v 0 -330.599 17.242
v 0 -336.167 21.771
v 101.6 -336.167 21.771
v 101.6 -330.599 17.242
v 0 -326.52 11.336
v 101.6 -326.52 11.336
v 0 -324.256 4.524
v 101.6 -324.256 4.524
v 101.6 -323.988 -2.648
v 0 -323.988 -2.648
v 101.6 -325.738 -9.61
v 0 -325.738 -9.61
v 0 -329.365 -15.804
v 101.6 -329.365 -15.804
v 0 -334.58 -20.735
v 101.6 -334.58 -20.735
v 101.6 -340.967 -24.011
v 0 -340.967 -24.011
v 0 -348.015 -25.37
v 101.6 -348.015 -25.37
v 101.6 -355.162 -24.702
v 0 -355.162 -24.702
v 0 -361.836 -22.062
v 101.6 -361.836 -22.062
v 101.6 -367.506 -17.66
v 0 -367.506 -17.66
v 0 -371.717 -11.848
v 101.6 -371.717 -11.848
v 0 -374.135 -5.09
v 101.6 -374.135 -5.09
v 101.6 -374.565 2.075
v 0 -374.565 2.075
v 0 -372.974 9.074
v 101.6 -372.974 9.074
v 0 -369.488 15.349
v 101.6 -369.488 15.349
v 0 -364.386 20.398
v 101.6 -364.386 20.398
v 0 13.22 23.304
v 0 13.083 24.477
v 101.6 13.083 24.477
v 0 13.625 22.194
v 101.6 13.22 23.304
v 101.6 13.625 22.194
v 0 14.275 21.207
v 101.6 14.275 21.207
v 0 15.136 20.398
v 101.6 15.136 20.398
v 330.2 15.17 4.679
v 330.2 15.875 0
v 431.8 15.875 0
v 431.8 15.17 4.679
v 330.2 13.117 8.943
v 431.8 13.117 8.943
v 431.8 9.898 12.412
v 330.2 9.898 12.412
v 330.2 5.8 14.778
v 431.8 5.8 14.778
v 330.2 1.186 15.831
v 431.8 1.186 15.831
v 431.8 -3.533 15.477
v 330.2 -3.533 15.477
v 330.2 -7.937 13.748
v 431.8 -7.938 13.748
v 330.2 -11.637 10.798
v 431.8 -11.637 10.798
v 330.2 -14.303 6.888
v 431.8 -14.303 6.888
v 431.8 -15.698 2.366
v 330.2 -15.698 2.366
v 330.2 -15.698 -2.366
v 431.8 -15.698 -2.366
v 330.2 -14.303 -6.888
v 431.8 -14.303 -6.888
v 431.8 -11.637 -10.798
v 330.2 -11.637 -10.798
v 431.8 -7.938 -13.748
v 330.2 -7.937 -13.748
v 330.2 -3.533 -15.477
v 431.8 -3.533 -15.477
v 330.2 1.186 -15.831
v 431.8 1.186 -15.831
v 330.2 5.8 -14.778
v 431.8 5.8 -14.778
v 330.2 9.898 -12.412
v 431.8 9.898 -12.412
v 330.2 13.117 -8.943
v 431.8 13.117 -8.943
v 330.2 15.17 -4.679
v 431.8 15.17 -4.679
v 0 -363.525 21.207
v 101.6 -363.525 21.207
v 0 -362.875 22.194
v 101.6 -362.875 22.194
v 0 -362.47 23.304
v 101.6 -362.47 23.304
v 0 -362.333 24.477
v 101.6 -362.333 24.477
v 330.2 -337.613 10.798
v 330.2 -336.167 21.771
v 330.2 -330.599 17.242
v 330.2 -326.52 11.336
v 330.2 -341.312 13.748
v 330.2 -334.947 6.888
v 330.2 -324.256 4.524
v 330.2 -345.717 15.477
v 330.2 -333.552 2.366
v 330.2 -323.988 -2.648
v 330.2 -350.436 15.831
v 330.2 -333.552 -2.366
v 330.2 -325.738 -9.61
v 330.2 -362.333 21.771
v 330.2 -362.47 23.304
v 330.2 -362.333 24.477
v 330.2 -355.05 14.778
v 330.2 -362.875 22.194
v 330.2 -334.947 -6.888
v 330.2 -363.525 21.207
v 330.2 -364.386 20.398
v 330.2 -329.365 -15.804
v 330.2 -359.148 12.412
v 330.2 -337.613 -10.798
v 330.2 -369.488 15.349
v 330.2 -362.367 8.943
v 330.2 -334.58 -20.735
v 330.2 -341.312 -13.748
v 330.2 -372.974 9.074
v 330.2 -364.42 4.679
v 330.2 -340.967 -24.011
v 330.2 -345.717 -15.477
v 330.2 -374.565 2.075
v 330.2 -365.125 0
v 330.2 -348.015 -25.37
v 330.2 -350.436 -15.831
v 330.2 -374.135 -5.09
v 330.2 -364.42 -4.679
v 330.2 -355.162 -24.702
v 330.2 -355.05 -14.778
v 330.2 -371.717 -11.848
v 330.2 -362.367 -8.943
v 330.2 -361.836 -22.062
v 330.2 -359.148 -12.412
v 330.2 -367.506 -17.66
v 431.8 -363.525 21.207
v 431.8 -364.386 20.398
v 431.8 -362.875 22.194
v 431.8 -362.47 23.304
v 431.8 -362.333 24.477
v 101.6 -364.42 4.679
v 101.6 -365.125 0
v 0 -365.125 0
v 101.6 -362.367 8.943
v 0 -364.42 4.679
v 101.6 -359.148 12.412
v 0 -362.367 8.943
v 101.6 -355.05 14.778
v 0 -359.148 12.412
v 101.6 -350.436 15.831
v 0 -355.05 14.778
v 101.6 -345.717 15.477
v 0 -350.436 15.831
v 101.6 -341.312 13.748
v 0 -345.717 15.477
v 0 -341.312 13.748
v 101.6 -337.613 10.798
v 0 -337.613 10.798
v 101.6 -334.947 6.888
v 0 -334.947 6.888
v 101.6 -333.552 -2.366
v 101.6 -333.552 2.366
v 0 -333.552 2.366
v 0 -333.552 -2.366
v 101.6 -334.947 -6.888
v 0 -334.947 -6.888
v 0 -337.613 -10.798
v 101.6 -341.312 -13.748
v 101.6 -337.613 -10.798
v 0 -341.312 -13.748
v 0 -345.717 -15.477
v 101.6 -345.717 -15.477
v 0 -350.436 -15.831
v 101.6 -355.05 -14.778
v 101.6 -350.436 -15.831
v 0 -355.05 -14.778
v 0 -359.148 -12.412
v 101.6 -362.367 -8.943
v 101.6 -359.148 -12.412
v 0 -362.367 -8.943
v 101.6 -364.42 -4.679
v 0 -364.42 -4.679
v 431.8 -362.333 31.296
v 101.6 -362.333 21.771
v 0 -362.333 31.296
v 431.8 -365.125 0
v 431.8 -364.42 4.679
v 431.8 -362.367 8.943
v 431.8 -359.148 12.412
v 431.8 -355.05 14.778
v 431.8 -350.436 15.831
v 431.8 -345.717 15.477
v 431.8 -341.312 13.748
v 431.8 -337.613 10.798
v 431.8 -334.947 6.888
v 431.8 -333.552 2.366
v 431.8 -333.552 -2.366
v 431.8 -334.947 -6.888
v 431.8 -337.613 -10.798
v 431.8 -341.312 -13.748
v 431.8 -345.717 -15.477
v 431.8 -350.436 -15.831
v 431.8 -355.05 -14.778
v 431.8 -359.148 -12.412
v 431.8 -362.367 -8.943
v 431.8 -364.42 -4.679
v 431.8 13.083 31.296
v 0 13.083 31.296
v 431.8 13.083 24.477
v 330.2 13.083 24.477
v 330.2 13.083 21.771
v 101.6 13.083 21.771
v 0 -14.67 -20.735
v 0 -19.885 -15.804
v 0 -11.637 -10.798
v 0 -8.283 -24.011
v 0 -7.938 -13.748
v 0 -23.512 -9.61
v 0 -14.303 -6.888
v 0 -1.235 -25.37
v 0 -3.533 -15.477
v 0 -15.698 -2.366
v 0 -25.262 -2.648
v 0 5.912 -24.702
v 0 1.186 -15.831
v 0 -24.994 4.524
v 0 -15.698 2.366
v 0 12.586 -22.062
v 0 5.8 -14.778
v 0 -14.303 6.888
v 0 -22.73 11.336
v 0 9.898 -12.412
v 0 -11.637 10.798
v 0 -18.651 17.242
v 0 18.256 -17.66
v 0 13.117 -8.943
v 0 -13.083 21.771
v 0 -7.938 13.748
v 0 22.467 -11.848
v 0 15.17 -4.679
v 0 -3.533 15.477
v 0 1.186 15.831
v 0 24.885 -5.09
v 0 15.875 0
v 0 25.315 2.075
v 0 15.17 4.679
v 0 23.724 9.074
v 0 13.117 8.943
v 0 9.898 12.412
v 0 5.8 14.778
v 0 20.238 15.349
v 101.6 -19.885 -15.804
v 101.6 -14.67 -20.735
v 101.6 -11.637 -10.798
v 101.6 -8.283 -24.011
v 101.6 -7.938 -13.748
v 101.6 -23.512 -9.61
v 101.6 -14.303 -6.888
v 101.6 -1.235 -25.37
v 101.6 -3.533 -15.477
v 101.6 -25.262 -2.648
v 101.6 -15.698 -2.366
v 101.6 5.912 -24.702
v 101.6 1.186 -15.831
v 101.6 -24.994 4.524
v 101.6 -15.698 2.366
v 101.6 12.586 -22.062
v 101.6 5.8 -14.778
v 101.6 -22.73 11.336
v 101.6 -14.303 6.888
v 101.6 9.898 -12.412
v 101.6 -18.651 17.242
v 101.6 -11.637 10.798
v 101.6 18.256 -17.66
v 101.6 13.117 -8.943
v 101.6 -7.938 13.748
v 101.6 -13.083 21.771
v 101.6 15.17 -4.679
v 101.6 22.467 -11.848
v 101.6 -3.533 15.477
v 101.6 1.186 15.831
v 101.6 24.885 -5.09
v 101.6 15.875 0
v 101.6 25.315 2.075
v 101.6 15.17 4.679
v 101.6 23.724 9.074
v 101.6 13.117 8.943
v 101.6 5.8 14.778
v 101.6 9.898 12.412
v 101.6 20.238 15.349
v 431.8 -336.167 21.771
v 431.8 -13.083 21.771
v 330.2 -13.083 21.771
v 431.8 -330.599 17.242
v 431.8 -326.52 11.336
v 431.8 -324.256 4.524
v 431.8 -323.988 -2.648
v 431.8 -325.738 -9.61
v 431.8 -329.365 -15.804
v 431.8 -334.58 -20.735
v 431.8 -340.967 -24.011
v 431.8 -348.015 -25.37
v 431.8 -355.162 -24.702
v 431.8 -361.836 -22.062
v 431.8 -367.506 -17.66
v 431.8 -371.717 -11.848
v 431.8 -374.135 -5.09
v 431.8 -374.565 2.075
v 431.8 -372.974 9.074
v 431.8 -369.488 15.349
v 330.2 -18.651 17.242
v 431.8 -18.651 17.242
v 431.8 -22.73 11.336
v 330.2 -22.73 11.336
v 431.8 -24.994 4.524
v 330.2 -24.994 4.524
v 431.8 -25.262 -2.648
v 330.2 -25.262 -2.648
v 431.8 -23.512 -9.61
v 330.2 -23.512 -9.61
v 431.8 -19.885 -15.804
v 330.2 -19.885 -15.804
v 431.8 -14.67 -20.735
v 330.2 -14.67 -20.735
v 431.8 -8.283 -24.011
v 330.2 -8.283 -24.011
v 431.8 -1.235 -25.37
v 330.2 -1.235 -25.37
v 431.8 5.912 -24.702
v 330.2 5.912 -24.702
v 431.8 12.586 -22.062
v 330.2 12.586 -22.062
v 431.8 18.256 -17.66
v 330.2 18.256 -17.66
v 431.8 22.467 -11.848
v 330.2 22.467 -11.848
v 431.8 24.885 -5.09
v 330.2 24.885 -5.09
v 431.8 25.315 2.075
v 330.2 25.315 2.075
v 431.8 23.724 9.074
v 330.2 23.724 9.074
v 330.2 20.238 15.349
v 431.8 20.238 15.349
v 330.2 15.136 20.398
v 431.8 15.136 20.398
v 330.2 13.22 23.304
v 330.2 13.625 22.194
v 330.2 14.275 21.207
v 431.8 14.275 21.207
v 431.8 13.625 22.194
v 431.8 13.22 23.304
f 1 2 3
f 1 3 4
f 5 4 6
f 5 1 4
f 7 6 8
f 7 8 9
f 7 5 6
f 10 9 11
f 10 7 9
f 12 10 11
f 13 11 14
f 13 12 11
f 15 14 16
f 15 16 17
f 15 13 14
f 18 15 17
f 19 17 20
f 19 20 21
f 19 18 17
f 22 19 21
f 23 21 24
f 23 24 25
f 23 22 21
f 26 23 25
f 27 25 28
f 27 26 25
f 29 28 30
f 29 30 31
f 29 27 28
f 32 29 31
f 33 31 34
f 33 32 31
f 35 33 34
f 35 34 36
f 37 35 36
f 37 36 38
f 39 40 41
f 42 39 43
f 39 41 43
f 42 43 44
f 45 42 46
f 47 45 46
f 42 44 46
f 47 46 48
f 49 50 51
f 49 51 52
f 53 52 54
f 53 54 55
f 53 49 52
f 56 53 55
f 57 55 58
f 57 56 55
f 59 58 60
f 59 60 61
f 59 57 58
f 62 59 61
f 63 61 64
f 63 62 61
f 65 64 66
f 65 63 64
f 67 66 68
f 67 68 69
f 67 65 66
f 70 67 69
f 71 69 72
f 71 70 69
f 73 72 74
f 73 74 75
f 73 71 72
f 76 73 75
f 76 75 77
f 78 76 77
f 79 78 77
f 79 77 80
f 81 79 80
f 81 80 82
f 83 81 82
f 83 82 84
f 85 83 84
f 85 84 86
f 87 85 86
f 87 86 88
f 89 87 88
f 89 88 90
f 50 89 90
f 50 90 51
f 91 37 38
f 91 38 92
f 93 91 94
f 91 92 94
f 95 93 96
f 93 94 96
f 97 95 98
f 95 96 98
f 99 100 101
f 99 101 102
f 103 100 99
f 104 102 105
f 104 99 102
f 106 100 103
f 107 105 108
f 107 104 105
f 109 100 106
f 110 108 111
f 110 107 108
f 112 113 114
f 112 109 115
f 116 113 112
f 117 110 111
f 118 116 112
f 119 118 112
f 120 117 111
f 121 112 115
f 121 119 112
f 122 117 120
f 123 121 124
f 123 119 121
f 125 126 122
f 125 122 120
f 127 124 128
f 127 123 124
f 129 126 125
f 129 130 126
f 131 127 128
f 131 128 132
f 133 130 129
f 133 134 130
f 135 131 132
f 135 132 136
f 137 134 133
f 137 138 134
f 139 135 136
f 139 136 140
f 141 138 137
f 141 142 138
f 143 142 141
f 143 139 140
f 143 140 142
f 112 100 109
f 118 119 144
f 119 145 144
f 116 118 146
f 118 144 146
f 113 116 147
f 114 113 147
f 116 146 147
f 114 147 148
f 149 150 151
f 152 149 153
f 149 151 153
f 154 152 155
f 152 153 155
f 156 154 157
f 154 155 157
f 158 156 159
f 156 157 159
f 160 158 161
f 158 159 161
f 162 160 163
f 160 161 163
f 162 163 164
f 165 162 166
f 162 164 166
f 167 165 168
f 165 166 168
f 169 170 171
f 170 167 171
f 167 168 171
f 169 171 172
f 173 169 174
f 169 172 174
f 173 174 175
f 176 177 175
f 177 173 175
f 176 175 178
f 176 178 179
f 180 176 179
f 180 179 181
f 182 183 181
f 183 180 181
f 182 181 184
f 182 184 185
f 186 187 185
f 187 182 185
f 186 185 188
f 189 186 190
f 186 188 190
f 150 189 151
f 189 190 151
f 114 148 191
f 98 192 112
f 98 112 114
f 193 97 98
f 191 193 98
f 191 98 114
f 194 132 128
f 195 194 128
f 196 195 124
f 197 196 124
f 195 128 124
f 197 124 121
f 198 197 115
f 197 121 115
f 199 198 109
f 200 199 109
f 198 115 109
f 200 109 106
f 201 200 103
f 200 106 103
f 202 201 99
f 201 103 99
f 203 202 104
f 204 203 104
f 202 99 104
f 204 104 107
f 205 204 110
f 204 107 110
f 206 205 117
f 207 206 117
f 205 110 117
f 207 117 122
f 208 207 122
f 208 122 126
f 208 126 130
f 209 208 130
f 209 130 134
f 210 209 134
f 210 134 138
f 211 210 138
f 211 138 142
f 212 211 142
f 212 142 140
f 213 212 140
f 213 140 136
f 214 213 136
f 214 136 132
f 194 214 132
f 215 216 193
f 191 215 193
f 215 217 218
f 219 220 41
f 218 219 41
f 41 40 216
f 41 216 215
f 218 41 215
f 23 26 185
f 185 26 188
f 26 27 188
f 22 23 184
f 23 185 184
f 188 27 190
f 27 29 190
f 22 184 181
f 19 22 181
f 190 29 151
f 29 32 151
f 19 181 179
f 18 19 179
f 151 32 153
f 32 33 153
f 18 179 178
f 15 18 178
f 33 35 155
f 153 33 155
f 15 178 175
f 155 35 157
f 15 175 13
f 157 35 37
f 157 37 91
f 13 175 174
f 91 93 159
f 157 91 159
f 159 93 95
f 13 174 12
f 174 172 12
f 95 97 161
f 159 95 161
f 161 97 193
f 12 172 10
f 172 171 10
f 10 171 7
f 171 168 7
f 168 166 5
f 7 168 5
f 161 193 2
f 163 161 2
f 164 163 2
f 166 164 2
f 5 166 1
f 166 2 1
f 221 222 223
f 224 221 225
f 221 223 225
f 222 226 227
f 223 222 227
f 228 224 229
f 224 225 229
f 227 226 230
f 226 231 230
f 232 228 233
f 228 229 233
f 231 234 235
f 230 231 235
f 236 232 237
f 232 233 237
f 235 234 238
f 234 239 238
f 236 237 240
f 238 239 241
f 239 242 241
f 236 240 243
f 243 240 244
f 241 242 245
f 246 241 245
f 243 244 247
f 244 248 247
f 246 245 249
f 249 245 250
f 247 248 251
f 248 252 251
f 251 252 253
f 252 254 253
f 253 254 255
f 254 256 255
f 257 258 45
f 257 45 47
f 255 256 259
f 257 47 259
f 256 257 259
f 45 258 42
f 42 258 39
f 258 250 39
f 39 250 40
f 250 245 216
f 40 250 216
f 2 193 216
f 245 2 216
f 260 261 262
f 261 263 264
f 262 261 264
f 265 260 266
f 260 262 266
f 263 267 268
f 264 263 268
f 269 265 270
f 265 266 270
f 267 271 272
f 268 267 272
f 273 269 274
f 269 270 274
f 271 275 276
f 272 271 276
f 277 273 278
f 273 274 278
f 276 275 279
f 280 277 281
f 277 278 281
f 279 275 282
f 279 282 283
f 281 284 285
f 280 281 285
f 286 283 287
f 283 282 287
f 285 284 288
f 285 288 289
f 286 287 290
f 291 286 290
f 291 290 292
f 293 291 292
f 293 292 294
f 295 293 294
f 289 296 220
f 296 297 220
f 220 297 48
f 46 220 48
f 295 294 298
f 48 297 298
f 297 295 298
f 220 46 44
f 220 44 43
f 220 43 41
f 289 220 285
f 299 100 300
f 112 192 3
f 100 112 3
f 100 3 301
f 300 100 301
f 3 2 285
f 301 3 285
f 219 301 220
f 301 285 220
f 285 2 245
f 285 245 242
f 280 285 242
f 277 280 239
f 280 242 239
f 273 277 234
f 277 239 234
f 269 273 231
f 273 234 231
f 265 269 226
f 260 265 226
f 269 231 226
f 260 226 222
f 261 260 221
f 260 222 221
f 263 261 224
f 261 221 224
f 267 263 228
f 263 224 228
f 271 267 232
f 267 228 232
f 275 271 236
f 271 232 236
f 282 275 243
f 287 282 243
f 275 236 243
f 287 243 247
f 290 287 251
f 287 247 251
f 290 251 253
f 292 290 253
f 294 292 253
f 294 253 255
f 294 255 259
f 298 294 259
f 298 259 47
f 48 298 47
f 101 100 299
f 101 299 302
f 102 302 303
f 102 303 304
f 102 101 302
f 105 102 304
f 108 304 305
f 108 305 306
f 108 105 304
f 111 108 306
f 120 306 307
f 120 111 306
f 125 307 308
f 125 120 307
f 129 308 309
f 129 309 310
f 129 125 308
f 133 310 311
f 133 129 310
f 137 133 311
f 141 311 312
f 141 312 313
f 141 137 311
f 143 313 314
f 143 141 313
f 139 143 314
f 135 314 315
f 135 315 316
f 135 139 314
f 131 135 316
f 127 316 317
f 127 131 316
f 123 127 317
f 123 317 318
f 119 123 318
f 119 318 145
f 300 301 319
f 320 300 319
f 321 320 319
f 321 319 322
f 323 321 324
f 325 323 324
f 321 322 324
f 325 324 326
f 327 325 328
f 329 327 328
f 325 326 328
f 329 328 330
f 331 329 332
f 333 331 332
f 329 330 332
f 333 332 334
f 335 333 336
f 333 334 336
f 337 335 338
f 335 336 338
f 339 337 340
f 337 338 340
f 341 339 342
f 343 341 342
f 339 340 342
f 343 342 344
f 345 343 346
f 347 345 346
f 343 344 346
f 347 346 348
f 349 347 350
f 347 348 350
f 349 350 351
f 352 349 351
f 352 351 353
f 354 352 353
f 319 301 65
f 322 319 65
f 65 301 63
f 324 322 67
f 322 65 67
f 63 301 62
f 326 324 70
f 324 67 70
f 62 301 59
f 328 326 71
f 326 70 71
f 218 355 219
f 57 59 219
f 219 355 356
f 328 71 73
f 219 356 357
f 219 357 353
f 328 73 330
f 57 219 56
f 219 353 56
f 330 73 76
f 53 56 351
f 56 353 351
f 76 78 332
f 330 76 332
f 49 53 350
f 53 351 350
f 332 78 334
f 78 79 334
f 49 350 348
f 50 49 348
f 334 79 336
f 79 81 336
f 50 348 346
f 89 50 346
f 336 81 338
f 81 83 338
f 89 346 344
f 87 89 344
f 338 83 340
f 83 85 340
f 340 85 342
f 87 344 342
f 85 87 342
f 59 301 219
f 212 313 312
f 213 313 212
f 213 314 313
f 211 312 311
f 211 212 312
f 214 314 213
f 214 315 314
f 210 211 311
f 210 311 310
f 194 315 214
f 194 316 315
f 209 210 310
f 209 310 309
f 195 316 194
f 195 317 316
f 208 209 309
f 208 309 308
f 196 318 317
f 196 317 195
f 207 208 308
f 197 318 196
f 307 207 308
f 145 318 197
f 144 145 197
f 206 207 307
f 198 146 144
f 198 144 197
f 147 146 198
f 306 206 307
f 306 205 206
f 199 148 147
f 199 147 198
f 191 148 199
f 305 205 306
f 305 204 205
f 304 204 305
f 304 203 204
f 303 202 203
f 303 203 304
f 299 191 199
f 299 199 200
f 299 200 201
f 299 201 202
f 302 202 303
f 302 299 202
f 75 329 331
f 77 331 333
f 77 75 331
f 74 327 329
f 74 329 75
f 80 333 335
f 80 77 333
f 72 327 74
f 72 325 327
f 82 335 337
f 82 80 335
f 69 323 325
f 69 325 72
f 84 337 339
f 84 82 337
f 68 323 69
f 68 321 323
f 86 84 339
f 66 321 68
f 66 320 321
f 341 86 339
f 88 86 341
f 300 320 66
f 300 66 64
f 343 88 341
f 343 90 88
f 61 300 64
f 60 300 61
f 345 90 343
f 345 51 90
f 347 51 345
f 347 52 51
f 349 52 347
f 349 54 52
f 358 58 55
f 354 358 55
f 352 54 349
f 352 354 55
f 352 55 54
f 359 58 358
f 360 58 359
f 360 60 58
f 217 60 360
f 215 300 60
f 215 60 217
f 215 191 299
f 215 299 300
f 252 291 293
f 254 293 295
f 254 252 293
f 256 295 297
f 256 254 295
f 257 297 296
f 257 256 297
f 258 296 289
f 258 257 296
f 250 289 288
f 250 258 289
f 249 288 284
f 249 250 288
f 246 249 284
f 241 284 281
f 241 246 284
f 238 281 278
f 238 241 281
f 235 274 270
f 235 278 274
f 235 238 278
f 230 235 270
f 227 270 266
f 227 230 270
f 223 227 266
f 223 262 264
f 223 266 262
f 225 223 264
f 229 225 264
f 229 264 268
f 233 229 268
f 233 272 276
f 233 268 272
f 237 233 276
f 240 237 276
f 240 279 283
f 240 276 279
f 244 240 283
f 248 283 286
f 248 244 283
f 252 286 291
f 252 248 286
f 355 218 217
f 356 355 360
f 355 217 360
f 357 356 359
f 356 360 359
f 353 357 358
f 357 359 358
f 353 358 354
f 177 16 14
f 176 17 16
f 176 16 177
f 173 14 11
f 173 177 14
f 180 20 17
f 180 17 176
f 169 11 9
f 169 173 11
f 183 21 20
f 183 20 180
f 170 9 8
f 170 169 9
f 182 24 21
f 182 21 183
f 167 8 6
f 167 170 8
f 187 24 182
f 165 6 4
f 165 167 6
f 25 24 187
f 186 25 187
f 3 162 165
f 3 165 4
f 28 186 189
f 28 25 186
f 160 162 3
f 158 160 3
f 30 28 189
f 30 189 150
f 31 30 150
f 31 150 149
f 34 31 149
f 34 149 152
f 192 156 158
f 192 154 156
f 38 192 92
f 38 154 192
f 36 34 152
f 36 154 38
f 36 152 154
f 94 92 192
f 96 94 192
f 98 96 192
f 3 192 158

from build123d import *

# Parameters (mm, degrees)
F0_R          = 15.875
F1_DEPTH      = 431.8
F3_DEPTH      = 67.056
F3_DEPTH_BACK = 51.816
F6_R          = 5.08


# Not quite as in the source:
# - a feature of the source that left no trace in its solid (it failed there, or was rolled back) is left out


with BuildPart() as f1:
    # F0 (on Right) → F1 (new body)
    with BuildSketch(Plane.YZ):
        with BuildLine():
            Line((-342.5169996576, 21.7714285714), (-13.0830003424, 21.7714285714))
            ThreePointArc((-13.0830003424, 21.7714285714), (0, -25.4), (13.0830003424, 21.7714285714))
            Line((13.0830003424, 21.7714285714), (13.0830003424, 31.2964285714))
            Line((13.0830003424, 31.2964285714), (-342.5169996576, 31.2964285714))
            Line((-342.5169996576, 31.2964285714), (-342.5169996576, 24.9464285714))
            Line((-342.5169996576, 24.9464285714), (-342.5169996576, 21.7714285714))
        make_face()
        Circle(F0_R, mode=Mode.SUBTRACT)
    extrude(amount=F1_DEPTH)

    # F2 (on face) → F3 (cut, two sides)
    with BuildSketch(Plane(origin=(0, 13.0830003424, 0), x_dir=(-1, 0, 0), z_dir=(0, 1, 0))) as f3_sk:
        Polygon((-101.6, 21.7714285714), (-215.9, 21.7714285714), (-330.2, 21.7714285714), (-330.2, -30.4525513202), (-228.6, -30.4525513202), (-101.6, -30.4525513202), align=None)
    extrude(amount=-F3_DEPTH, mode=Mode.SUBTRACT)
    extrude(f3_sk.sketch, amount=F3_DEPTH_BACK, mode=Mode.SUBTRACT)

    # F5: F1 across plane


with BuildPart() as f1_1:
    add(f1.part)
    add(f1.part.mirror(Plane.XZ.offset(174.625)))

    # F6
    f6_edges = [f1_1.edges().sort_by_distance(p)[0] for p in [
        (50.8, -362.333, 21.771429),
        (381, -362.333, 21.771429),
        (50.8, 13.083, 21.771429),
        (381, 13.083, 21.771429),
    ]]
    fillet(f6_edges, radius=F6_R)


solid = f1_1.part
